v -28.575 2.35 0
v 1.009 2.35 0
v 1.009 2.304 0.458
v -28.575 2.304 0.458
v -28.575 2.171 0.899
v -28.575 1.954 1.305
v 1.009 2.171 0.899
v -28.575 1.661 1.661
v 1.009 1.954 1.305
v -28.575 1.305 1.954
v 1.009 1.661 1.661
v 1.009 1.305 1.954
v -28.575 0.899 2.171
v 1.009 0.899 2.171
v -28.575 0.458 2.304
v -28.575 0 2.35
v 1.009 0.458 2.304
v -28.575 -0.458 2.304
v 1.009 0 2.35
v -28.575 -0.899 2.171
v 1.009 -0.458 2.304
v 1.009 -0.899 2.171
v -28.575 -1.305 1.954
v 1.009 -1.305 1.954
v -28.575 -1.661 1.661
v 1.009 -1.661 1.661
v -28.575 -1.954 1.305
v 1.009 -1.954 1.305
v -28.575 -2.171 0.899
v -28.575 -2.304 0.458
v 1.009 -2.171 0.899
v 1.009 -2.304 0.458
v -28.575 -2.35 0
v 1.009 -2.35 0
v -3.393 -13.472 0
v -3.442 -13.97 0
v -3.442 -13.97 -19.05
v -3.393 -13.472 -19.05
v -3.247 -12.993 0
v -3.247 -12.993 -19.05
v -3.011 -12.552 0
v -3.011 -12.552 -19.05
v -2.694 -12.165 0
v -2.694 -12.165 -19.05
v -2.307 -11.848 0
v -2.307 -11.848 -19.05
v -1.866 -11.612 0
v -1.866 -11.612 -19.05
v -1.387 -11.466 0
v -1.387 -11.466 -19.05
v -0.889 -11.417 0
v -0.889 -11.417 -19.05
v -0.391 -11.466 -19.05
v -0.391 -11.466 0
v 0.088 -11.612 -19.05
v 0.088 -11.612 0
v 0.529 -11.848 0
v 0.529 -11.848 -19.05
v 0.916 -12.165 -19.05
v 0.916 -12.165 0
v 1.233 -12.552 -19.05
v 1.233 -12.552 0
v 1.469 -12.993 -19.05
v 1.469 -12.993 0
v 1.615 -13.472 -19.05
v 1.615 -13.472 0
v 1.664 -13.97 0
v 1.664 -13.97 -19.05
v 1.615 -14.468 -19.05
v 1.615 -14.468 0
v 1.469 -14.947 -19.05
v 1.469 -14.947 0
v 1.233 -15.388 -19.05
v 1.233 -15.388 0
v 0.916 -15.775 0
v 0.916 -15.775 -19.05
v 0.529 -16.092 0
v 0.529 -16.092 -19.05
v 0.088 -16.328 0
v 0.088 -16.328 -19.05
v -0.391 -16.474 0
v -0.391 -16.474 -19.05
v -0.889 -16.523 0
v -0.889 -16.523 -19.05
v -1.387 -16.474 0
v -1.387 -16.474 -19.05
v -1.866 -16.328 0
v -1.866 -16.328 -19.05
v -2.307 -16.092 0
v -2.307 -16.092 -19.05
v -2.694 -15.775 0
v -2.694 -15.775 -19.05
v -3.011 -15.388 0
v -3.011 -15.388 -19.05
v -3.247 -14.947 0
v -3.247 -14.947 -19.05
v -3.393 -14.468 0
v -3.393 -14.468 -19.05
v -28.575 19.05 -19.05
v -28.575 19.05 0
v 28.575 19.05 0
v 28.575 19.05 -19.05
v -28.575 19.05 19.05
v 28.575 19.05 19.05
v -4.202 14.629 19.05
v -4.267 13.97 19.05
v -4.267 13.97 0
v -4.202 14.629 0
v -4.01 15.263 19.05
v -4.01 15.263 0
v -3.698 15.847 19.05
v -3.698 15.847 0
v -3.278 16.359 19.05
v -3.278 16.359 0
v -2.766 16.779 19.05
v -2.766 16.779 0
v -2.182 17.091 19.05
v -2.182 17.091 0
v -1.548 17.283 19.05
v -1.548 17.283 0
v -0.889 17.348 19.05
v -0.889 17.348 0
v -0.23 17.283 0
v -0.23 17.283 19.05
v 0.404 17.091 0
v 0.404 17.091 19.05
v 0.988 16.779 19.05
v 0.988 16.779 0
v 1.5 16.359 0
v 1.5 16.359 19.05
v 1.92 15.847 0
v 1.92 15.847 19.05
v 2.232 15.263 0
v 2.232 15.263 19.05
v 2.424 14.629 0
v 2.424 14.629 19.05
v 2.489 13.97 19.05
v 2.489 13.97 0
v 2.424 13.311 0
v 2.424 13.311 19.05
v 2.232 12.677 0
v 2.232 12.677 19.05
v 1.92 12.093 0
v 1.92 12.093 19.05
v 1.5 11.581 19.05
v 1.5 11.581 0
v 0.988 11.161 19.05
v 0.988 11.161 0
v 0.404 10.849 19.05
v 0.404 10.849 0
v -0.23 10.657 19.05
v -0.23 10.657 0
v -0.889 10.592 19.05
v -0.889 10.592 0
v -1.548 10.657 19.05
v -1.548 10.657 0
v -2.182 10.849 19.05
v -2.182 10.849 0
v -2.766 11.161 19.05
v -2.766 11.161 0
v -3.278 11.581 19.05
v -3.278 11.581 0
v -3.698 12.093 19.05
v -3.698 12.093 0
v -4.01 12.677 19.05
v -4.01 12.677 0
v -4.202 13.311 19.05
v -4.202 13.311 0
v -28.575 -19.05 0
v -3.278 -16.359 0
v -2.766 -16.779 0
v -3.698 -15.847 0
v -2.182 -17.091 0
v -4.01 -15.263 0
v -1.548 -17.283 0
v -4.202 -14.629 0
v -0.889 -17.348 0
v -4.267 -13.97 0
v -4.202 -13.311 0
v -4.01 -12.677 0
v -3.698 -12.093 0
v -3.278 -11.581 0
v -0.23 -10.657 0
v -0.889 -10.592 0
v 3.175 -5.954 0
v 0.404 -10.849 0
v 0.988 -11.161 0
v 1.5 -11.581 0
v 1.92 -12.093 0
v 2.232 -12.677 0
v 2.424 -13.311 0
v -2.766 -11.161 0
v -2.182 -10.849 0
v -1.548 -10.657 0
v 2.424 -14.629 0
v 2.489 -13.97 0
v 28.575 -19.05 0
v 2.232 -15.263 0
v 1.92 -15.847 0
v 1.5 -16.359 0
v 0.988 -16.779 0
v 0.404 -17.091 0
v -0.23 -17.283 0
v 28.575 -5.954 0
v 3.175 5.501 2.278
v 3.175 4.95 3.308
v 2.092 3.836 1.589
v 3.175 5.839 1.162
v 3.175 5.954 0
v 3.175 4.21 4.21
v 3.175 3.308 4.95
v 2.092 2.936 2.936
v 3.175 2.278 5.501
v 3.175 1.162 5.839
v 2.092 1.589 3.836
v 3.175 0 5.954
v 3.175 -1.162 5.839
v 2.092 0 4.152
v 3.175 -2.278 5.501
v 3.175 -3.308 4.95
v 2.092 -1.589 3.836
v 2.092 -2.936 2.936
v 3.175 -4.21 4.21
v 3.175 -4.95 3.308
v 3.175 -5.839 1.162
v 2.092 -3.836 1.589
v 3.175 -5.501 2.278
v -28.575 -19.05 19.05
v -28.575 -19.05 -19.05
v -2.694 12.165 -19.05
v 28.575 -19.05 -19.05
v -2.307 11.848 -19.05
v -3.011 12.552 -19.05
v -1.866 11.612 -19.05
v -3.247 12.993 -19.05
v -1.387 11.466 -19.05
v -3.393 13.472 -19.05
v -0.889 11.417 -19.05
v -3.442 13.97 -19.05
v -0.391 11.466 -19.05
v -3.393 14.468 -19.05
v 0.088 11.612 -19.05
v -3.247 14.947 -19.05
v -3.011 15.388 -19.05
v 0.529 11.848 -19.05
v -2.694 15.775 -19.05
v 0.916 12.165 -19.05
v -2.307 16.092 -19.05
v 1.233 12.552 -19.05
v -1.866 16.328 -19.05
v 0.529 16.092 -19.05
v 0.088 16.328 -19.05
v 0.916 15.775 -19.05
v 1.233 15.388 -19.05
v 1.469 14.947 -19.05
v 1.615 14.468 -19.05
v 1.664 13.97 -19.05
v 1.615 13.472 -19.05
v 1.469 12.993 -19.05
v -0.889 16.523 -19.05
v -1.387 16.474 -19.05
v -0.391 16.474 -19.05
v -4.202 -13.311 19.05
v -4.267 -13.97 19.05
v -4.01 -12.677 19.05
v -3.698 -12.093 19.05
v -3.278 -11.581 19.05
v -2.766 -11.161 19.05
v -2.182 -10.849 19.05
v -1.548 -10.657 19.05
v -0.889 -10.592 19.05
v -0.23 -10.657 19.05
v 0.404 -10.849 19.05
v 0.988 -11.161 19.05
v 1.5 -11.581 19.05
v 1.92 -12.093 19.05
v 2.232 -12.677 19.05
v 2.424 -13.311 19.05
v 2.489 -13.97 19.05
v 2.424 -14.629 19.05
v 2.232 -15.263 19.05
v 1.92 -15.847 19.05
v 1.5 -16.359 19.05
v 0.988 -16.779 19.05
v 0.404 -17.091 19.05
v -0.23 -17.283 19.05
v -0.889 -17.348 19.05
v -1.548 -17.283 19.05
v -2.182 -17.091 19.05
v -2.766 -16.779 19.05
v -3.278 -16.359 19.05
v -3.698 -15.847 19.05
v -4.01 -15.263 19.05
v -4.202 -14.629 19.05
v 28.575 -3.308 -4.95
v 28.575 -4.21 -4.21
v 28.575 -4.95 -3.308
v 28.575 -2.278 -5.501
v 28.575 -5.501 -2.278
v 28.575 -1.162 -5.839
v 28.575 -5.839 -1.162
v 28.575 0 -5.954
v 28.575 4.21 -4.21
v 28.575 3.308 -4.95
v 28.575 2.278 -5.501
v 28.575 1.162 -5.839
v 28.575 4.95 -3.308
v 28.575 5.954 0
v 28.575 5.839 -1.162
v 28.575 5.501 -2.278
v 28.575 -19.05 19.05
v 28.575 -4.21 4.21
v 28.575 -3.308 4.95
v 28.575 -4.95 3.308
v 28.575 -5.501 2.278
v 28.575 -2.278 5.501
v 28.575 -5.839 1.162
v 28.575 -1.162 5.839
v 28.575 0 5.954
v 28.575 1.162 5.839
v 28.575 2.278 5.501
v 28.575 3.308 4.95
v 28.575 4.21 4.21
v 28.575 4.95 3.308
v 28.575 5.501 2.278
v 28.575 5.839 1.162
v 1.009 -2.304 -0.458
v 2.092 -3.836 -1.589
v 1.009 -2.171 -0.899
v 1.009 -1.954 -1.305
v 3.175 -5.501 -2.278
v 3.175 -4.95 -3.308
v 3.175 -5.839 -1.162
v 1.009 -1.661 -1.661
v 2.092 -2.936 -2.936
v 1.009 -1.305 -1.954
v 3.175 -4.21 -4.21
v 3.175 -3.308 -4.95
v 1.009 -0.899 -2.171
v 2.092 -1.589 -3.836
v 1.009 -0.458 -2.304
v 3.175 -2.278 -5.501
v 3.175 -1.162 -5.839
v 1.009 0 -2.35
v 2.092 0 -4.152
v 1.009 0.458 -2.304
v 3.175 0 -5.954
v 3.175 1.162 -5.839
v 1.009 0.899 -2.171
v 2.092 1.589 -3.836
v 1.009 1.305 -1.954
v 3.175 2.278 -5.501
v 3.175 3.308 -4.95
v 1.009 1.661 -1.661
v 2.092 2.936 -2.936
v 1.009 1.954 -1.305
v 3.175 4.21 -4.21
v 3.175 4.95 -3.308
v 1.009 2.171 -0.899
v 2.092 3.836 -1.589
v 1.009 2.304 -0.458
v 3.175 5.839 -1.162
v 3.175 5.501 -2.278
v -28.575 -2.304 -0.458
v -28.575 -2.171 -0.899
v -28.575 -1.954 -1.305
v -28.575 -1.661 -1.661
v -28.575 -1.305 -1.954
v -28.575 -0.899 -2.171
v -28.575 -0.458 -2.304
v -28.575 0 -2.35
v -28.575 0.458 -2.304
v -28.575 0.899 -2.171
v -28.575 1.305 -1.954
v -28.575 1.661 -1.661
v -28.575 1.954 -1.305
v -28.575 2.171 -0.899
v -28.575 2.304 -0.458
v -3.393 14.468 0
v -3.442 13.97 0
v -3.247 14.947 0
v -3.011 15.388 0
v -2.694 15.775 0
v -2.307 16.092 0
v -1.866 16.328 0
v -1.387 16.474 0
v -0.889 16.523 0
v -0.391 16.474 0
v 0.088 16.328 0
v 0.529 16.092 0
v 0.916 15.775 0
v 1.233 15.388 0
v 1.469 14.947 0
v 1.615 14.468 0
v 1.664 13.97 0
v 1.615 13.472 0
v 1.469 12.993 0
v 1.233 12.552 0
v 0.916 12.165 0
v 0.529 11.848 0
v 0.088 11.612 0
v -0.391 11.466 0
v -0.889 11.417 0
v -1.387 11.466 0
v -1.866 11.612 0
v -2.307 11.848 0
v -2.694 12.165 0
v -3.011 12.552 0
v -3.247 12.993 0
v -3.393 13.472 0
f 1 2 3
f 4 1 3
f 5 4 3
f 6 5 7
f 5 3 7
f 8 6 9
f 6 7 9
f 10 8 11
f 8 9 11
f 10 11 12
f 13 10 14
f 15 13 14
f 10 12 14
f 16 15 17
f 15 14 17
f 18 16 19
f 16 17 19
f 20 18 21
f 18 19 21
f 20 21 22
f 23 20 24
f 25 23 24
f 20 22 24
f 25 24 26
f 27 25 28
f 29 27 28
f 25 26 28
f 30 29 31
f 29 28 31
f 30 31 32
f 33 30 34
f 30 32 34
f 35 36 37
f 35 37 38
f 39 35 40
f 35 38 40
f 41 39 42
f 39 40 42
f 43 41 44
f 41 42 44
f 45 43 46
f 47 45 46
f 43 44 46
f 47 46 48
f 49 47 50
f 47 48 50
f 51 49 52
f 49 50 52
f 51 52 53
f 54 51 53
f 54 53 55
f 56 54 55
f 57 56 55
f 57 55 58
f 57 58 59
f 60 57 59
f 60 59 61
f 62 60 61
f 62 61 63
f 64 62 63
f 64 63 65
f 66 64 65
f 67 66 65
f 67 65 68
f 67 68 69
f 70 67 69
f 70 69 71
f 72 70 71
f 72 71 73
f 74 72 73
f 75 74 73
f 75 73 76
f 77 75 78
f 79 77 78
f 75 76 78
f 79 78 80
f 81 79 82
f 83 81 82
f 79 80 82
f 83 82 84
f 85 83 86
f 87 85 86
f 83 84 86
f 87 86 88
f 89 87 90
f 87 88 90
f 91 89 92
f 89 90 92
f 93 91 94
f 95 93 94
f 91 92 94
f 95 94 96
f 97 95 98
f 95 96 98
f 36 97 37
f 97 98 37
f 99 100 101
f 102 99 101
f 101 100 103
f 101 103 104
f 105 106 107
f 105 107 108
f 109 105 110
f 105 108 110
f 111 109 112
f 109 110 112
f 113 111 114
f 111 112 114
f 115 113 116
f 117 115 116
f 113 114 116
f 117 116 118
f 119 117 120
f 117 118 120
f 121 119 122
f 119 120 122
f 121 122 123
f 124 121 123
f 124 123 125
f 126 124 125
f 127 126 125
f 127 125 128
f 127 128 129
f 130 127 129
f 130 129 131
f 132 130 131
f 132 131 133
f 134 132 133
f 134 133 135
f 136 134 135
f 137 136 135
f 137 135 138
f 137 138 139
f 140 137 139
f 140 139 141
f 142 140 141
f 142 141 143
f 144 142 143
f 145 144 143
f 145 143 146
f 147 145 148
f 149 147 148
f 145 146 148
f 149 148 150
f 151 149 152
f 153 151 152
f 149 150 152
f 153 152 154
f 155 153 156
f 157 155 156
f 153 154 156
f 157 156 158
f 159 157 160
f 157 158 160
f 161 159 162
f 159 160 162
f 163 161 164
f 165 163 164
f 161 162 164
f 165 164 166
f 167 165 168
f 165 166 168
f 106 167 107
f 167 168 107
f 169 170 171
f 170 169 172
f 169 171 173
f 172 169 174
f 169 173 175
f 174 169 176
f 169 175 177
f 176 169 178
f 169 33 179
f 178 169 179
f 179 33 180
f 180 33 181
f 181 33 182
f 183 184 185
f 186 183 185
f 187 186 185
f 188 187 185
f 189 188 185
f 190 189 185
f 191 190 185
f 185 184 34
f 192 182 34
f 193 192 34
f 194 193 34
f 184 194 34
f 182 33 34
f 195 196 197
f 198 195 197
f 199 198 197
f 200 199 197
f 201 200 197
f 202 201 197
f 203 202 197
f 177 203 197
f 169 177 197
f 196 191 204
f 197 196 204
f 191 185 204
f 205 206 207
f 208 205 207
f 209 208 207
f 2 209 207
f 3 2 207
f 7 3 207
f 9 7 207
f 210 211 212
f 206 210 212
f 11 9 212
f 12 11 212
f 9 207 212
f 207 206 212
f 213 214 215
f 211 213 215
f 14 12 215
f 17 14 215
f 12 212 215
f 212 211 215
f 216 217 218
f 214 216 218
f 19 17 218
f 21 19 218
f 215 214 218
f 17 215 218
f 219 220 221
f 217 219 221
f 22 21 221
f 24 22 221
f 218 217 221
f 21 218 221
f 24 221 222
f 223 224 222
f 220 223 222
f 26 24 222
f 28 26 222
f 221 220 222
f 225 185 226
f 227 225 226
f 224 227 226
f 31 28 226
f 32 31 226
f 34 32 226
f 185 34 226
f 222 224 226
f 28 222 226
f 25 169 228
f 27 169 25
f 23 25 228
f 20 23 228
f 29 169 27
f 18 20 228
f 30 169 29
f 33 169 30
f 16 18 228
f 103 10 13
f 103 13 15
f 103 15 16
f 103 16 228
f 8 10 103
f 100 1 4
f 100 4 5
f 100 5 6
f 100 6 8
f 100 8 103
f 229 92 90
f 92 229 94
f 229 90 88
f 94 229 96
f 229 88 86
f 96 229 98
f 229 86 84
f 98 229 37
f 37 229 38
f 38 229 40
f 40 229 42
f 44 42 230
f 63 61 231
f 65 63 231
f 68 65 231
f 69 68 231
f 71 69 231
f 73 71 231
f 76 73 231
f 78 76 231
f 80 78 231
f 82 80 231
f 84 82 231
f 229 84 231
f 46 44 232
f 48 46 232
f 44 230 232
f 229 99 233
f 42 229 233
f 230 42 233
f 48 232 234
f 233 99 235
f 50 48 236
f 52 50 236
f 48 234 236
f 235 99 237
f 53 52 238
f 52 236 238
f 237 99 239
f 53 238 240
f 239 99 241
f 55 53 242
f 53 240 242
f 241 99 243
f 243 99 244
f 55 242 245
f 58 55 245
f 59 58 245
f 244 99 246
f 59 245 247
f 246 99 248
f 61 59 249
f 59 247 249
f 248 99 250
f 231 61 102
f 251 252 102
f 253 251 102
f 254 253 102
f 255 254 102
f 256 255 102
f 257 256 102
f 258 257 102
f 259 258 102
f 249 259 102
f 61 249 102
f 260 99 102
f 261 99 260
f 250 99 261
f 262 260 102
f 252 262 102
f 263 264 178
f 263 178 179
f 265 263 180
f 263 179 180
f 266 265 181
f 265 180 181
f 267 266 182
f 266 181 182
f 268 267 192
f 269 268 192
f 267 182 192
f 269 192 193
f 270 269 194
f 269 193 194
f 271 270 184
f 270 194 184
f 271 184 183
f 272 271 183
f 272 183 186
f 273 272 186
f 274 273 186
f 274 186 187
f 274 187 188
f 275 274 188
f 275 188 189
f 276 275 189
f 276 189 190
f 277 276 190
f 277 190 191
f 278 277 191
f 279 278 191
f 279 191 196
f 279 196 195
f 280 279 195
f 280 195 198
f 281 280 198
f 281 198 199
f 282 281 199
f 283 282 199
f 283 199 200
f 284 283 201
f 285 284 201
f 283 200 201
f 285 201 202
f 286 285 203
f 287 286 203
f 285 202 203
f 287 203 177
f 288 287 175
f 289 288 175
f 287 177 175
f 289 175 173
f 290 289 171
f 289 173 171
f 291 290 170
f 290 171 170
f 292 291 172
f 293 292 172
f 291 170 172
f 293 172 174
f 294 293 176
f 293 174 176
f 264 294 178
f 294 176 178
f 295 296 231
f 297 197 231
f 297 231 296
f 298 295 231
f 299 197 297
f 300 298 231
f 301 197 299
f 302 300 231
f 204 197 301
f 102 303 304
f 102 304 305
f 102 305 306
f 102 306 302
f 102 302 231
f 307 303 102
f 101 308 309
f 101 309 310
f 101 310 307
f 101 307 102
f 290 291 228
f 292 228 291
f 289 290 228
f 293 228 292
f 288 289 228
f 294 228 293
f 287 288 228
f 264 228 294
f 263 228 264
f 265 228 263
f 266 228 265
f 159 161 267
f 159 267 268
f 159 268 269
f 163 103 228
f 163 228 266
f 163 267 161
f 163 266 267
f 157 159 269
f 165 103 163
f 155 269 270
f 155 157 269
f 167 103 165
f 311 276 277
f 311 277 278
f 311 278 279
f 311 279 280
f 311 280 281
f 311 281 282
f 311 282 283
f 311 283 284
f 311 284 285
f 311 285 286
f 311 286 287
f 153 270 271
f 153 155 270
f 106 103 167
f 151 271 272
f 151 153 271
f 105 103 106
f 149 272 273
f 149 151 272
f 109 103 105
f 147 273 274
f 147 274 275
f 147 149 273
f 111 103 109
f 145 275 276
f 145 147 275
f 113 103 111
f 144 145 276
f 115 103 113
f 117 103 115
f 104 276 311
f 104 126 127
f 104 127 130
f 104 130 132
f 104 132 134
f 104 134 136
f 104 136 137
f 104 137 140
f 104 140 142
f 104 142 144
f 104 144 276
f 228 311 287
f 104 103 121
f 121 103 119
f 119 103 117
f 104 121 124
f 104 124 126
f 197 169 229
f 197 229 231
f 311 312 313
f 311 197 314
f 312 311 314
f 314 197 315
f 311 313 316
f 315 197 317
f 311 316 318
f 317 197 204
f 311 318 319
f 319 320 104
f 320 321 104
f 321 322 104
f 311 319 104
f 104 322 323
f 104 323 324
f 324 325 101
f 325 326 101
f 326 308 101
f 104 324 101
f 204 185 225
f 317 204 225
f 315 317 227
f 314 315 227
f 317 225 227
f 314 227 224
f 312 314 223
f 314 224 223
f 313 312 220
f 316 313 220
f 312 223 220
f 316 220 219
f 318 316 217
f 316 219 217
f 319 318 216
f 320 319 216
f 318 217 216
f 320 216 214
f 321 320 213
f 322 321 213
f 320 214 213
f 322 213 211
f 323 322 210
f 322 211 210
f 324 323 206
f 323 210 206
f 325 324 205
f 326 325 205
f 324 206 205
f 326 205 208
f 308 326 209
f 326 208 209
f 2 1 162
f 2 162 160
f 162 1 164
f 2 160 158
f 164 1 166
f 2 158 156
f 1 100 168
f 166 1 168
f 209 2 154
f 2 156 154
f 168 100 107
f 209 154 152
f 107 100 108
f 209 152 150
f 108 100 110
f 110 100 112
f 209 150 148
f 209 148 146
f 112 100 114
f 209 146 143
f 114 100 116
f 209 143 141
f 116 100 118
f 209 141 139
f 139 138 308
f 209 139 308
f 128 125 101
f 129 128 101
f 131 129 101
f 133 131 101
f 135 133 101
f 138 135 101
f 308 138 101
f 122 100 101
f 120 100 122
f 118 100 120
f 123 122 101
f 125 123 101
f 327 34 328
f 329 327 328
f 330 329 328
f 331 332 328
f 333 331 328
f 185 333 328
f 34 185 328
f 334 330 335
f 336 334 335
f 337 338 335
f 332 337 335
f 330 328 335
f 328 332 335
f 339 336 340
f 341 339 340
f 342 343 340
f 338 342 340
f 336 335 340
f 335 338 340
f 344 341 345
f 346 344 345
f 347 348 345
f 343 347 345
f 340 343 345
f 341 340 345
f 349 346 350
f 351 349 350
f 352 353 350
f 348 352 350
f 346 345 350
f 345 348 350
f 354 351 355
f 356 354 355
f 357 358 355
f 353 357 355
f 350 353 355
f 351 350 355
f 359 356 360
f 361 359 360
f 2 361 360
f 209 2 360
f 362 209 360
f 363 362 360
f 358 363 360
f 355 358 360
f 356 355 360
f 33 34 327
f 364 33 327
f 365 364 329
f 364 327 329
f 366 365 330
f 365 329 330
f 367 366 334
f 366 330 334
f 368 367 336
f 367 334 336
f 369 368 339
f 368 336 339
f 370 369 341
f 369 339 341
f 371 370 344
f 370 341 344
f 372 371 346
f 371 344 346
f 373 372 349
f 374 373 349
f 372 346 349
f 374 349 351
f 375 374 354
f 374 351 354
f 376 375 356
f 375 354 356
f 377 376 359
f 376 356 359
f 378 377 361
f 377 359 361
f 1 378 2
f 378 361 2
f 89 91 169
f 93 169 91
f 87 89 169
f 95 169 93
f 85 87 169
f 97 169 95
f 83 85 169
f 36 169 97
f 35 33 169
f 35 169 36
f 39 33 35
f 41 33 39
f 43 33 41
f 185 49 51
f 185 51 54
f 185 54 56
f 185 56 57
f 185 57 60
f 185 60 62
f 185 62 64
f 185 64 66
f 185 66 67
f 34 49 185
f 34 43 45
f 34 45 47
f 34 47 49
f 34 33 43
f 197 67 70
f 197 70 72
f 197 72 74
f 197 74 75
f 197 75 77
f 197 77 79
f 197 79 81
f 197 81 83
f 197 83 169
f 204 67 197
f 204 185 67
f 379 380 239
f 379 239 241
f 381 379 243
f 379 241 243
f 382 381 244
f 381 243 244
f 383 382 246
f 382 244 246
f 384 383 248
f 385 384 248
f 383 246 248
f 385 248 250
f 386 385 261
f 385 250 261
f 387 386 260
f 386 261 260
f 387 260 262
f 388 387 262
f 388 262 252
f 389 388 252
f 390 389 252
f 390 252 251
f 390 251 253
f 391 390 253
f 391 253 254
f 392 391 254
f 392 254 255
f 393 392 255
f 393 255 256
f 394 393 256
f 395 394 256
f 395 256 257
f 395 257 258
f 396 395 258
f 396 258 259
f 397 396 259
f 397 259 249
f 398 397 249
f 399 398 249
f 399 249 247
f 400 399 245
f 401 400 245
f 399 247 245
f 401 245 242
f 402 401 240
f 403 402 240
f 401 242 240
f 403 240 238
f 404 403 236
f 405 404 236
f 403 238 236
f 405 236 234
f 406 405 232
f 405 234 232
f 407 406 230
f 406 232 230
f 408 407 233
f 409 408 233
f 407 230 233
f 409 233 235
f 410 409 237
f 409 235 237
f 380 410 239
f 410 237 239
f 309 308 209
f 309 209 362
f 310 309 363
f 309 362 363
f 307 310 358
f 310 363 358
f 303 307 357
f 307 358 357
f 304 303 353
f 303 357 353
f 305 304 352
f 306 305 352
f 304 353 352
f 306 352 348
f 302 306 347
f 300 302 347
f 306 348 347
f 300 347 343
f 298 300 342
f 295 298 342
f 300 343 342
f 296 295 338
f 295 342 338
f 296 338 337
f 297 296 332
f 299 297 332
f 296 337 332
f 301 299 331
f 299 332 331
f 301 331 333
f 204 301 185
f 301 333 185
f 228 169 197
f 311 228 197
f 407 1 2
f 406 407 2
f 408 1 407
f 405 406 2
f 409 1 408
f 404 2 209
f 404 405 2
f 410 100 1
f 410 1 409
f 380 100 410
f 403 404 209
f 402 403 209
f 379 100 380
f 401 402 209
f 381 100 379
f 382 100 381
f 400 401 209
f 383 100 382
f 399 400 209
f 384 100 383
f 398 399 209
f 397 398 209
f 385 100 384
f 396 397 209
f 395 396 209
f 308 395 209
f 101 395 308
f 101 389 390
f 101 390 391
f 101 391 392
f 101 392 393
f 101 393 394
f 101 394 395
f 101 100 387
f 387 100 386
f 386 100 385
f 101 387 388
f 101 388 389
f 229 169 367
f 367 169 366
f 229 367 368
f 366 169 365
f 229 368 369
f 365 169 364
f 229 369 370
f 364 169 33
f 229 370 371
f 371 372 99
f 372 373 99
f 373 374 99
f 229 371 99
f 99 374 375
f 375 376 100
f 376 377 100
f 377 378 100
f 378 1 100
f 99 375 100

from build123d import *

# Parameters (mm, degrees)
F3_W       = 57.15
F3_H       = 38.1
F4_DEPTH   = 19.05
F5_DEPTH   = 19.05
F7_D       = 11.90752
F7_DEPTH   = 25.4
F7_TIP     = 3.5773799191
F7_2_D     = 11.90752
F7_2_DEPTH = 25.4
F7_2_TIP   = 3.5773799191
F9_D       = 4.699
F9_2_D     = 4.699
F11_D      = 6.7564
F13_D      = 5.1054


# Not quite as in the source:
# - a variable given as a bare number and used for a length is read in inches; the dataset says mm whatever the document's units were


with BuildPart() as f4:
    # F3 (on Top) → F4 (new body)
    with BuildSketch(Plane.XY):
        Rectangle(F3_W, F3_H)
    extrude(amount=F4_DEPTH)

    # F7
    with Locations(Plane.YZ.offset(28.575)):
        with Locations((0, 0)):
            Hole(F7_D / 2, depth=F7_DEPTH)
            with Locations((0, 0, -(F7_DEPTH + F7_TIP / 2))):  # 118° drill point
                Cone(0, F7_D / 2, F7_TIP, mode=Mode.SUBTRACT)

    # F9 (through all)
    with Locations(Plane(origin=(-28.575, 0, 0), x_dir=(0, -1, 0), z_dir=(-1, 0, 0))):
        with Locations((0, 0)):
            Hole(F9_D / 2)

    # F11 (through all)
    with Locations(Plane.XY.offset(19.05)):
        with Locations((-0.889, -13.97), (-0.889, 13.97)):
            Hole(F11_D / 2)


with BuildPart() as f5:
    # F3 (on Top) → F5 (new body)
    with BuildSketch(Plane.XY):
        Rectangle(F3_W, F3_H)
    extrude(amount=-F5_DEPTH)

    # F7#2
    with Locations(Plane.YZ.offset(28.575)):
        with Locations((0, 0)):
            Hole(F7_2_D / 2, depth=F7_2_DEPTH)
            with Locations((0, 0, -(F7_2_DEPTH + F7_2_TIP / 2))):  # 118° drill point
                Cone(0, F7_2_D / 2, F7_2_TIP, mode=Mode.SUBTRACT)

    # F9#2 (through all)
    with Locations(Plane(origin=(-28.575, 0, 0), x_dir=(0, -1, 0), z_dir=(-1, 0, 0))):
        with Locations((0, 0)):
            Hole(F9_2_D / 2)

    # F13 (through all)
    with Locations(Plane.XY):
        with Locations((-0.889, 13.97), (-0.889, -13.97)):
            Hole(F13_D / 2)


solid = Compound([f4.part, f5.part])
